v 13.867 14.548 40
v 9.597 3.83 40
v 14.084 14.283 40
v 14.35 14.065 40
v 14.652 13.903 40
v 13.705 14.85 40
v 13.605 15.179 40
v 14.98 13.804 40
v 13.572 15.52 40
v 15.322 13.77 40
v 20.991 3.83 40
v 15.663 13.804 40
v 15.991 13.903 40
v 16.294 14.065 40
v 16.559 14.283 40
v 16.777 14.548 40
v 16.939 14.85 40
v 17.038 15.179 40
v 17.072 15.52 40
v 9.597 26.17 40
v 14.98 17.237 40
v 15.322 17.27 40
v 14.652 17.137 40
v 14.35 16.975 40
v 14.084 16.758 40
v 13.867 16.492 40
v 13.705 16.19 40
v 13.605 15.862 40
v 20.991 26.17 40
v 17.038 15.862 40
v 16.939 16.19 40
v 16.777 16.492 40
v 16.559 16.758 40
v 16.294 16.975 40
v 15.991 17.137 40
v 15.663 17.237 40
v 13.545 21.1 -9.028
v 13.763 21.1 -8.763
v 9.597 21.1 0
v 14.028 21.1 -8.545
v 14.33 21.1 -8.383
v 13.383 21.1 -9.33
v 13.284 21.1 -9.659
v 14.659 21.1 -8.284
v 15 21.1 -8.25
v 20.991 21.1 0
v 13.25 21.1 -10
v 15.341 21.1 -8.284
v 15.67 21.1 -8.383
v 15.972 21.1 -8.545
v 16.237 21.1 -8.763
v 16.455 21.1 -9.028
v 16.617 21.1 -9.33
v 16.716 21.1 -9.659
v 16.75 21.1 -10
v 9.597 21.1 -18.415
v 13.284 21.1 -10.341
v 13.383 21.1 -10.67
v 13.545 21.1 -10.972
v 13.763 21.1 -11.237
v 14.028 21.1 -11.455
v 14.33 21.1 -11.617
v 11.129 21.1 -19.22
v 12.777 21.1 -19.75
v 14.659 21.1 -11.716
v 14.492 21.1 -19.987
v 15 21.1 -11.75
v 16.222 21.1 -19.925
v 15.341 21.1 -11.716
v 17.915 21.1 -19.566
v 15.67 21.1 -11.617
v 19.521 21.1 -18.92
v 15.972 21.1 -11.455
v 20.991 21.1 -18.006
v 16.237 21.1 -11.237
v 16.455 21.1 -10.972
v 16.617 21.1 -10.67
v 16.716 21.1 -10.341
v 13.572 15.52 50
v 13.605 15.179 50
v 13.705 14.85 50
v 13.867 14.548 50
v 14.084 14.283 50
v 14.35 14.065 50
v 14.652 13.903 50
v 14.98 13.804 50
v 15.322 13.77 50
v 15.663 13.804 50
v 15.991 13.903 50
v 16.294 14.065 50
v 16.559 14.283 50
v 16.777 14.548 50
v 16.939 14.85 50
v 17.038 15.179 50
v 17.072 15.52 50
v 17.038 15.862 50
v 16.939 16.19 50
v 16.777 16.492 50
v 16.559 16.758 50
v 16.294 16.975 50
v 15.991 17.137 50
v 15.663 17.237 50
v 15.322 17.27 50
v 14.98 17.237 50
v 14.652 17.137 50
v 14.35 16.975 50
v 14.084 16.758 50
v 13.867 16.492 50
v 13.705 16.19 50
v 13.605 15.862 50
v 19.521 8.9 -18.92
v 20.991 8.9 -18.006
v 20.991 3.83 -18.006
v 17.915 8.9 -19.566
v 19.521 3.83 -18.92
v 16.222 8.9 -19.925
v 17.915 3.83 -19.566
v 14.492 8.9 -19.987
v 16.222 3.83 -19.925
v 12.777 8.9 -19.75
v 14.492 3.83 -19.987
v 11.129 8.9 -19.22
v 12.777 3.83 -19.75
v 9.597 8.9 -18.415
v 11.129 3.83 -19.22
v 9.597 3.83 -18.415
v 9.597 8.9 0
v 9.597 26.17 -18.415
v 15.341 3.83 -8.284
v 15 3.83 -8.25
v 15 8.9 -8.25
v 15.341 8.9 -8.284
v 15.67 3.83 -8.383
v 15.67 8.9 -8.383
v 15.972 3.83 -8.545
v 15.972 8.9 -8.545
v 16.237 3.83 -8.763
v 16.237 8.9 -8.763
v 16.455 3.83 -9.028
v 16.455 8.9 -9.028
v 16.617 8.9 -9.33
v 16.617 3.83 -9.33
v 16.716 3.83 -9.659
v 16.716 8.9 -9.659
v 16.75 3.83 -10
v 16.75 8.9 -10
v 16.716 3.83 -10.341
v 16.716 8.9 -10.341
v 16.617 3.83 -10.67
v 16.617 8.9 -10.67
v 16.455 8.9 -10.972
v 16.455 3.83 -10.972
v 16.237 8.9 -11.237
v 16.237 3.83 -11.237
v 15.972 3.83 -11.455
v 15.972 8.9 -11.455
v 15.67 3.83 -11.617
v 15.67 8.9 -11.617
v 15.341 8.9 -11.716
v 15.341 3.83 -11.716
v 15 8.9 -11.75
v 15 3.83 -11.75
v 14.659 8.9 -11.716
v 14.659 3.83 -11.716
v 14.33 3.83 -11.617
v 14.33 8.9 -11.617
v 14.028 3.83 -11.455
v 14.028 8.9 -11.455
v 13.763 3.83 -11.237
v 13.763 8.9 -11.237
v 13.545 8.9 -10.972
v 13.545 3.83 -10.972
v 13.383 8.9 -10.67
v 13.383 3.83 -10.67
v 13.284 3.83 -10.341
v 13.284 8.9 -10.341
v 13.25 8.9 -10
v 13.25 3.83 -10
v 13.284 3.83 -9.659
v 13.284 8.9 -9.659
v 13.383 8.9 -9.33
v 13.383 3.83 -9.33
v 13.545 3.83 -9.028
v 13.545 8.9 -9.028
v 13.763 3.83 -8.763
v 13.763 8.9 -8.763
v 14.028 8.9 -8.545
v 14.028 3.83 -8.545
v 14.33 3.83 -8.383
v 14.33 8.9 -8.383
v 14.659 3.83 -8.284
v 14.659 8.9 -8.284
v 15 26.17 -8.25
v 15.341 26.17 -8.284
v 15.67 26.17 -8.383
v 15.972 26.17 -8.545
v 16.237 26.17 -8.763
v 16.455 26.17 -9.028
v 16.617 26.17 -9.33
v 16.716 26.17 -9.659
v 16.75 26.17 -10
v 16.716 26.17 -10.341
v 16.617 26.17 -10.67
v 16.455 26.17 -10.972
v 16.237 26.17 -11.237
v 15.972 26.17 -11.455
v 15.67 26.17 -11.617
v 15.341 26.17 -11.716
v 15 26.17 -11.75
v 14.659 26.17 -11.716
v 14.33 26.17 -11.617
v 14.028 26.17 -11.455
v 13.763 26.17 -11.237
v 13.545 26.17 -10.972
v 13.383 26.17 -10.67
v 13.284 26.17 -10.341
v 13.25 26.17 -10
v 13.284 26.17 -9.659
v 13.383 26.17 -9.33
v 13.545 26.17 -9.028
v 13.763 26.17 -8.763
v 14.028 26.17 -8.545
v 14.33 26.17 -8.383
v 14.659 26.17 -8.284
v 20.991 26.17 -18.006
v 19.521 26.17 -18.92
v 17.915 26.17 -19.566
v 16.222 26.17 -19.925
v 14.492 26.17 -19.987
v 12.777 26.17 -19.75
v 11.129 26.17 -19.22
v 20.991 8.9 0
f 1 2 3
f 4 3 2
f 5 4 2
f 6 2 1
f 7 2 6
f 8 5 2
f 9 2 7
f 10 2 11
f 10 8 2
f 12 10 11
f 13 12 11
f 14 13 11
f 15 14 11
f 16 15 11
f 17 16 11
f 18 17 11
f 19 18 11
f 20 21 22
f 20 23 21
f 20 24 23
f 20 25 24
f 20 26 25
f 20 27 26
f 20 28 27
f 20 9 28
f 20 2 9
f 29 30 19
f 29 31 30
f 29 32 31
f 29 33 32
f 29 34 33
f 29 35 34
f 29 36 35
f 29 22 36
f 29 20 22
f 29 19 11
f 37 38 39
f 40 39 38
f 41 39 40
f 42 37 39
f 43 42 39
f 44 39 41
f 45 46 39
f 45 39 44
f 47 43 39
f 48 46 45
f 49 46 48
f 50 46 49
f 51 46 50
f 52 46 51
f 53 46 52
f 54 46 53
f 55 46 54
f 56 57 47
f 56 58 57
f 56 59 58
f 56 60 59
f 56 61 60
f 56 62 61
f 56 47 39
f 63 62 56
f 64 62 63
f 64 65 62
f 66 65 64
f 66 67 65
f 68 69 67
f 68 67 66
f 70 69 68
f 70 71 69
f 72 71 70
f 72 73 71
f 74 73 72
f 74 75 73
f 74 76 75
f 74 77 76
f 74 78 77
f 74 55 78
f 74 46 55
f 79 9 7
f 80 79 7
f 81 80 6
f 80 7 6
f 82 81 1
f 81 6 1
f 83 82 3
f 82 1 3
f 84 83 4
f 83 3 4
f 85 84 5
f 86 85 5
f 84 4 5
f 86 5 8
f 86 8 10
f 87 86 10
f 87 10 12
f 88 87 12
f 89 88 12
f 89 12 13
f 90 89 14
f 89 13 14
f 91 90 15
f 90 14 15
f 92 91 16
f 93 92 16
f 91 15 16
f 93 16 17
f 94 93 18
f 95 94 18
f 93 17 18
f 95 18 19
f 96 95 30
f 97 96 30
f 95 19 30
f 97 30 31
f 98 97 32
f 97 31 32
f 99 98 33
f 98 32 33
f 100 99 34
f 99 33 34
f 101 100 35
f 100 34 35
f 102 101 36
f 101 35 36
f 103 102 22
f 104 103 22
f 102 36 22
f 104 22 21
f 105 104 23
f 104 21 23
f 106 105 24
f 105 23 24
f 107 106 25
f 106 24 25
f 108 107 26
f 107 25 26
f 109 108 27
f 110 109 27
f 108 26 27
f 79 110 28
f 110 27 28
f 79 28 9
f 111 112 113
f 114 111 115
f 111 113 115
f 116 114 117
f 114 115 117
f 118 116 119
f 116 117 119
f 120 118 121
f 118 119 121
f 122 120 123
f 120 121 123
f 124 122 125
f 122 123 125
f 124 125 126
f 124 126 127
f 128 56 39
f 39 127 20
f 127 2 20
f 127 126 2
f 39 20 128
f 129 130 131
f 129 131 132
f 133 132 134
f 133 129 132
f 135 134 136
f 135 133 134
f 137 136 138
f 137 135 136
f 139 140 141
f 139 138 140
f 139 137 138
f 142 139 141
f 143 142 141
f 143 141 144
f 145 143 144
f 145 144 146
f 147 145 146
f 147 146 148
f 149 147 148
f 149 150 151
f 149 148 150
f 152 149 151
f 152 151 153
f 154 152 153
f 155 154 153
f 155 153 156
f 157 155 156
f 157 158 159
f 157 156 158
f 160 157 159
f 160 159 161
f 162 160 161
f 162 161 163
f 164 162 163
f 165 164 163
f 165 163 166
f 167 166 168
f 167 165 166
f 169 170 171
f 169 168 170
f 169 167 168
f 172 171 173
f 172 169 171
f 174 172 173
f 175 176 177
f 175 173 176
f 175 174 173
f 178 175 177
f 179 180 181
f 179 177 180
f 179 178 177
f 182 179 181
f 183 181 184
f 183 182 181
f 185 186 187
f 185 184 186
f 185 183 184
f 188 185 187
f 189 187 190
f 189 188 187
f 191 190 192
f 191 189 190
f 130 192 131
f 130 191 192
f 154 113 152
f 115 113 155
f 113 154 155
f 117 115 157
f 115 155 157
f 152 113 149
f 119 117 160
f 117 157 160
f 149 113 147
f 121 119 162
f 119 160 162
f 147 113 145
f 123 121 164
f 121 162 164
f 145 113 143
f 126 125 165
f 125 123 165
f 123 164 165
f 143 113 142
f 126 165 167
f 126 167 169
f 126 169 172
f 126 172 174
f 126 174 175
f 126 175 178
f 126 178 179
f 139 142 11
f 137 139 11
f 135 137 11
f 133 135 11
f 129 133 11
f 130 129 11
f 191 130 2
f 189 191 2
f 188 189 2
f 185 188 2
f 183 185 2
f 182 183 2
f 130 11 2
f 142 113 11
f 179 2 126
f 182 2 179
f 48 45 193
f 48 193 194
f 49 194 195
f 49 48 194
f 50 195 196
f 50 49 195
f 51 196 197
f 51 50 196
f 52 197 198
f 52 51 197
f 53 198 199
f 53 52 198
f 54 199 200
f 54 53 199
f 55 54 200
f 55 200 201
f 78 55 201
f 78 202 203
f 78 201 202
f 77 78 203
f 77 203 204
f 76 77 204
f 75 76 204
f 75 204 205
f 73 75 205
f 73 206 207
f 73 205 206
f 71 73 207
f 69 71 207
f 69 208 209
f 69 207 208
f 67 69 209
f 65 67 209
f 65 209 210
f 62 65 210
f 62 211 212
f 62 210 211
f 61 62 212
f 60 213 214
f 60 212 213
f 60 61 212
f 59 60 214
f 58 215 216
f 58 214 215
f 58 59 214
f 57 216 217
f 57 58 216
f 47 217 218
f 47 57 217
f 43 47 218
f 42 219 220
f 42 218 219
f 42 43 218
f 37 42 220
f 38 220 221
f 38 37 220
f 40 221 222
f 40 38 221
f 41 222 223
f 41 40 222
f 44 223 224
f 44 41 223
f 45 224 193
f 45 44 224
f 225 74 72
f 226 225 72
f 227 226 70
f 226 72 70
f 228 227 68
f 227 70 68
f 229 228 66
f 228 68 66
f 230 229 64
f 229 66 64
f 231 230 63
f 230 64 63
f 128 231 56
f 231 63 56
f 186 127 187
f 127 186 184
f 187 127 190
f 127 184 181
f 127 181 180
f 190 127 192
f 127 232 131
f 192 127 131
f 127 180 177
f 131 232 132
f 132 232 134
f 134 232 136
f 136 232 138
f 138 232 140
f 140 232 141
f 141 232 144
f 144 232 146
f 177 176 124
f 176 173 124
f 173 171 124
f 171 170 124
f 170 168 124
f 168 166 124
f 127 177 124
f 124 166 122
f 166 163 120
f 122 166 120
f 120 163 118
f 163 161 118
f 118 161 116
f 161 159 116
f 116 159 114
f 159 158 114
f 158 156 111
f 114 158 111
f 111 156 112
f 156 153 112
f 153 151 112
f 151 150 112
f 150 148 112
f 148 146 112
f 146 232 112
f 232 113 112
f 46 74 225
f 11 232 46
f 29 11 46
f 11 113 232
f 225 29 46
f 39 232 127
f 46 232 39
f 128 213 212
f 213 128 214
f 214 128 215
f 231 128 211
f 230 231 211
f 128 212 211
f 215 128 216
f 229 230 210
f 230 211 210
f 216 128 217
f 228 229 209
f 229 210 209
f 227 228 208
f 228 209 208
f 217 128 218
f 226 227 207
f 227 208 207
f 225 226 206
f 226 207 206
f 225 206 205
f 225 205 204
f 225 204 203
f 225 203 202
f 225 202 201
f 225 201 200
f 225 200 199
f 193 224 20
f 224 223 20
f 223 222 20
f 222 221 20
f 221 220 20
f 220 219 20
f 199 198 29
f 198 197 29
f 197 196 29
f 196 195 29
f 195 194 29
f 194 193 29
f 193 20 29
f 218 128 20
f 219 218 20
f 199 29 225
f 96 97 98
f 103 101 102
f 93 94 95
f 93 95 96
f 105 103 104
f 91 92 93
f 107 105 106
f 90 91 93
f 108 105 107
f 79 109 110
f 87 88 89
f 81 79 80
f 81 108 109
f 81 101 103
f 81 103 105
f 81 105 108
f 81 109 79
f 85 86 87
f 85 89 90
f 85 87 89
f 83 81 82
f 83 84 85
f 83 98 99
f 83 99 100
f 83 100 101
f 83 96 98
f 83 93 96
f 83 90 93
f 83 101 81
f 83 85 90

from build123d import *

# Parameters (mm, degrees)
SKETCH3_W            = 30
SKETCH3_H            = 30
BOSS_EXTRUDE1_DEPTH  = 40
CUT_EXTRUDE4_START   = -40
CUT_EXTRUDE4_DEPTH   = 99.309518948
MIRROR5_START        = -40
MIRROR5_COPY_1_DEPTH = 99.309518948
SKETCH9_R            = 1.75
BOSS_EXTRUDE2_DEPTH  = 30
CUT_EXTRUDE5_DEPTH   = 30
SKETCH11_W           = 20
SKETCH11_H           = 12.2
CUT_EXTRUDE6_DEPTH   = 44.5
SKETCH12_R           = 1.75
BOSS_EXTRUDE3_DEPTH  = 10
CUT_EXTRUDE13_DEPTH  = 67
SKETCH16_W           = 6.483229808
SKETCH16_H           = 22.339130026
SKETCH16_W_2         = 7.133382066
CUT_EXTRUDE14_DEPTH  = 67


with BuildPart() as part:
    # Sketch3 → Boss-Extrude1 (new body)
    with BuildSketch(Plane.XY):
        with Locations((15, 15)):
            Rectangle(SKETCH3_W, SKETCH3_H)
    extrude(amount=BOSS_EXTRUDE1_DEPTH)

    # Sketch8 → Cut-Extrude4 (cut)
    with BuildSketch(Plane(origin=(0, 0, 0), x_dir=(-1, 0, 0), z_dir=(0, 0, -1)).offset(CUT_EXTRUDE4_START)):
        Polygon((-77.236567429, -51.703622198), (-30, 17.572977849), (-21.526577959, 30), (25.70998947, 99.276600047), (-112.843210625, 193.749734905), (-215.789767524, 42.769512659), align=None)
    cut_extrude4 = extrude(amount=CUT_EXTRUDE4_DEPTH, mode=Mode.SUBTRACT)

    # Mirror4: Cut-Extrude4 across plane
    add(cut_extrude4.mirror(Plane.ZY.offset(-15)), mode=Mode.SUBTRACT)

    # Mirror5: Cut-Extrude4 across plane
    add(cut_extrude4.mirror(Plane(origin=(0, 15, 0), x_dir=(0, 0, 1), z_dir=(0, -1, 0))), mode=Mode.SUBTRACT)

    # Mirror5 copy 1 sketch → Mirror5 copy 1 (cut)
    with BuildSketch(Plane(origin=(30, 30, 0), x_dir=(1, 0, 0), z_dir=(0, 0, -1)).offset(MIRROR5_START)):
        Polygon((-77.236567429, -51.703622198), (-30, 17.572977849), (-21.526577959, 30), (25.70998947, 99.276600047), (-112.843210625, 193.749734905), (-215.789767524, 42.769512659), align=None)
    extrude(amount=MIRROR5_COPY_1_DEPTH, mode=Mode.SUBTRACT)

    # Sketch9 → Boss-Extrude2 (add)
    with BuildSketch(Plane(origin=(0, 0, 0), x_dir=(1, 0, 0), z_dir=(0, 1, 0))):
        with BuildLine():
            Line((5.769230769, 13.846153846), (0, 0))
            Line((0, 0), (30, 0))
            Line((30, 0), (24.924823528, 11.223878236))
            Line((24.924823528, 11.223878236), (22.474176558, 16.643544594))
            ThreePointArc((22.474176558, 16.643544594), (13.348408887, 19.862669355), (5.769230769, 13.846153846))
        make_face()
        with Locations(Location((15, 10, 0), (0, 0, 270))):
            Circle(SKETCH9_R, mode=Mode.SUBTRACT)
    extrude(amount=BOSS_EXTRUDE2_DEPTH)

    # Sketch10 → Cut-Extrude5 (cut)
    with BuildSketch(Plane.XY):
        Polygon((0, 17.572977849), (8.473422041, 30), (0, 30), align=None)
        Polygon((8.473422041, 0), (0, 0), (0, 12.427022151), align=None)
        Polygon((21.526577959, 0), (30, 12.427022151), (30, 0), align=None)
        Polygon((30, 17.572977849), (21.526577959, 30), (30, 30), align=None)
    extrude(amount=-CUT_EXTRUDE5_DEPTH, mode=Mode.SUBTRACT)

    # Sketch11 → Cut-Extrude6 (cut, symmetric)
    with BuildSketch(Plane(origin=(30, 0, 0), x_dir=(0, 0, -1), z_dir=(1, 0, 0))):
        with Locations((10, 15)):
            Rectangle(SKETCH11_W, SKETCH11_H)
    extrude(amount=CUT_EXTRUDE6_DEPTH, both=True, mode=Mode.SUBTRACT)

    # Sketch12 → Boss-Extrude3 (add)
    with BuildSketch(Plane.XY.offset(40)):
        with Locations(Location((15.321801173, 15.520127928, 0), (0, 0, 180))):
            Circle(SKETCH12_R)
    extrude(amount=BOSS_EXTRUDE3_DEPTH)

    # Sketch15 → Cut-Extrude13 (cut)
    with BuildSketch(Plane.XY.offset(40)):
        Polygon((8.473422041, 30), (5.86162238, 26.169565013), (24.13837762, 26.169565013), (21.526577959, 30), align=None)
        Polygon((30, 17.572977849), (24.220848208, 26.048614609), (24.220848208, 15), (30, 15), align=None)
        Polygon((30, 15), (24.220848208, 15), (24.220848208, 3.951385391), (30, 12.427022151), align=None)
        Polygon((24.13837762, 3.830434987), (5.86162238, 3.830434987), (8.473422041, 0), (21.526577959, 0), align=None)
        Polygon((5.769230769, 3.965935447), (5.815144659, 15), (0, 15), (0, 12.427022151), align=None)
        Polygon((5.815144659, 15), (5.86162238, 26.169565013), (0, 17.572977849), (0, 15), align=None)
    extrude(amount=-CUT_EXTRUDE13_DEPTH, mode=Mode.SUBTRACT)

    # Sketch16 → Cut-Extrude14 (cut)
    with BuildSketch(Plane.XY.offset(40)):
        with Locations((6.355269315, 15)):
            Rectangle(SKETCH16_W, SKETCH16_H)
        with Locations((24.558031714, 15)):
            Rectangle(SKETCH16_W_2, SKETCH16_H)
    extrude(amount=-CUT_EXTRUDE14_DEPTH, mode=Mode.SUBTRACT)


solid = part.part
